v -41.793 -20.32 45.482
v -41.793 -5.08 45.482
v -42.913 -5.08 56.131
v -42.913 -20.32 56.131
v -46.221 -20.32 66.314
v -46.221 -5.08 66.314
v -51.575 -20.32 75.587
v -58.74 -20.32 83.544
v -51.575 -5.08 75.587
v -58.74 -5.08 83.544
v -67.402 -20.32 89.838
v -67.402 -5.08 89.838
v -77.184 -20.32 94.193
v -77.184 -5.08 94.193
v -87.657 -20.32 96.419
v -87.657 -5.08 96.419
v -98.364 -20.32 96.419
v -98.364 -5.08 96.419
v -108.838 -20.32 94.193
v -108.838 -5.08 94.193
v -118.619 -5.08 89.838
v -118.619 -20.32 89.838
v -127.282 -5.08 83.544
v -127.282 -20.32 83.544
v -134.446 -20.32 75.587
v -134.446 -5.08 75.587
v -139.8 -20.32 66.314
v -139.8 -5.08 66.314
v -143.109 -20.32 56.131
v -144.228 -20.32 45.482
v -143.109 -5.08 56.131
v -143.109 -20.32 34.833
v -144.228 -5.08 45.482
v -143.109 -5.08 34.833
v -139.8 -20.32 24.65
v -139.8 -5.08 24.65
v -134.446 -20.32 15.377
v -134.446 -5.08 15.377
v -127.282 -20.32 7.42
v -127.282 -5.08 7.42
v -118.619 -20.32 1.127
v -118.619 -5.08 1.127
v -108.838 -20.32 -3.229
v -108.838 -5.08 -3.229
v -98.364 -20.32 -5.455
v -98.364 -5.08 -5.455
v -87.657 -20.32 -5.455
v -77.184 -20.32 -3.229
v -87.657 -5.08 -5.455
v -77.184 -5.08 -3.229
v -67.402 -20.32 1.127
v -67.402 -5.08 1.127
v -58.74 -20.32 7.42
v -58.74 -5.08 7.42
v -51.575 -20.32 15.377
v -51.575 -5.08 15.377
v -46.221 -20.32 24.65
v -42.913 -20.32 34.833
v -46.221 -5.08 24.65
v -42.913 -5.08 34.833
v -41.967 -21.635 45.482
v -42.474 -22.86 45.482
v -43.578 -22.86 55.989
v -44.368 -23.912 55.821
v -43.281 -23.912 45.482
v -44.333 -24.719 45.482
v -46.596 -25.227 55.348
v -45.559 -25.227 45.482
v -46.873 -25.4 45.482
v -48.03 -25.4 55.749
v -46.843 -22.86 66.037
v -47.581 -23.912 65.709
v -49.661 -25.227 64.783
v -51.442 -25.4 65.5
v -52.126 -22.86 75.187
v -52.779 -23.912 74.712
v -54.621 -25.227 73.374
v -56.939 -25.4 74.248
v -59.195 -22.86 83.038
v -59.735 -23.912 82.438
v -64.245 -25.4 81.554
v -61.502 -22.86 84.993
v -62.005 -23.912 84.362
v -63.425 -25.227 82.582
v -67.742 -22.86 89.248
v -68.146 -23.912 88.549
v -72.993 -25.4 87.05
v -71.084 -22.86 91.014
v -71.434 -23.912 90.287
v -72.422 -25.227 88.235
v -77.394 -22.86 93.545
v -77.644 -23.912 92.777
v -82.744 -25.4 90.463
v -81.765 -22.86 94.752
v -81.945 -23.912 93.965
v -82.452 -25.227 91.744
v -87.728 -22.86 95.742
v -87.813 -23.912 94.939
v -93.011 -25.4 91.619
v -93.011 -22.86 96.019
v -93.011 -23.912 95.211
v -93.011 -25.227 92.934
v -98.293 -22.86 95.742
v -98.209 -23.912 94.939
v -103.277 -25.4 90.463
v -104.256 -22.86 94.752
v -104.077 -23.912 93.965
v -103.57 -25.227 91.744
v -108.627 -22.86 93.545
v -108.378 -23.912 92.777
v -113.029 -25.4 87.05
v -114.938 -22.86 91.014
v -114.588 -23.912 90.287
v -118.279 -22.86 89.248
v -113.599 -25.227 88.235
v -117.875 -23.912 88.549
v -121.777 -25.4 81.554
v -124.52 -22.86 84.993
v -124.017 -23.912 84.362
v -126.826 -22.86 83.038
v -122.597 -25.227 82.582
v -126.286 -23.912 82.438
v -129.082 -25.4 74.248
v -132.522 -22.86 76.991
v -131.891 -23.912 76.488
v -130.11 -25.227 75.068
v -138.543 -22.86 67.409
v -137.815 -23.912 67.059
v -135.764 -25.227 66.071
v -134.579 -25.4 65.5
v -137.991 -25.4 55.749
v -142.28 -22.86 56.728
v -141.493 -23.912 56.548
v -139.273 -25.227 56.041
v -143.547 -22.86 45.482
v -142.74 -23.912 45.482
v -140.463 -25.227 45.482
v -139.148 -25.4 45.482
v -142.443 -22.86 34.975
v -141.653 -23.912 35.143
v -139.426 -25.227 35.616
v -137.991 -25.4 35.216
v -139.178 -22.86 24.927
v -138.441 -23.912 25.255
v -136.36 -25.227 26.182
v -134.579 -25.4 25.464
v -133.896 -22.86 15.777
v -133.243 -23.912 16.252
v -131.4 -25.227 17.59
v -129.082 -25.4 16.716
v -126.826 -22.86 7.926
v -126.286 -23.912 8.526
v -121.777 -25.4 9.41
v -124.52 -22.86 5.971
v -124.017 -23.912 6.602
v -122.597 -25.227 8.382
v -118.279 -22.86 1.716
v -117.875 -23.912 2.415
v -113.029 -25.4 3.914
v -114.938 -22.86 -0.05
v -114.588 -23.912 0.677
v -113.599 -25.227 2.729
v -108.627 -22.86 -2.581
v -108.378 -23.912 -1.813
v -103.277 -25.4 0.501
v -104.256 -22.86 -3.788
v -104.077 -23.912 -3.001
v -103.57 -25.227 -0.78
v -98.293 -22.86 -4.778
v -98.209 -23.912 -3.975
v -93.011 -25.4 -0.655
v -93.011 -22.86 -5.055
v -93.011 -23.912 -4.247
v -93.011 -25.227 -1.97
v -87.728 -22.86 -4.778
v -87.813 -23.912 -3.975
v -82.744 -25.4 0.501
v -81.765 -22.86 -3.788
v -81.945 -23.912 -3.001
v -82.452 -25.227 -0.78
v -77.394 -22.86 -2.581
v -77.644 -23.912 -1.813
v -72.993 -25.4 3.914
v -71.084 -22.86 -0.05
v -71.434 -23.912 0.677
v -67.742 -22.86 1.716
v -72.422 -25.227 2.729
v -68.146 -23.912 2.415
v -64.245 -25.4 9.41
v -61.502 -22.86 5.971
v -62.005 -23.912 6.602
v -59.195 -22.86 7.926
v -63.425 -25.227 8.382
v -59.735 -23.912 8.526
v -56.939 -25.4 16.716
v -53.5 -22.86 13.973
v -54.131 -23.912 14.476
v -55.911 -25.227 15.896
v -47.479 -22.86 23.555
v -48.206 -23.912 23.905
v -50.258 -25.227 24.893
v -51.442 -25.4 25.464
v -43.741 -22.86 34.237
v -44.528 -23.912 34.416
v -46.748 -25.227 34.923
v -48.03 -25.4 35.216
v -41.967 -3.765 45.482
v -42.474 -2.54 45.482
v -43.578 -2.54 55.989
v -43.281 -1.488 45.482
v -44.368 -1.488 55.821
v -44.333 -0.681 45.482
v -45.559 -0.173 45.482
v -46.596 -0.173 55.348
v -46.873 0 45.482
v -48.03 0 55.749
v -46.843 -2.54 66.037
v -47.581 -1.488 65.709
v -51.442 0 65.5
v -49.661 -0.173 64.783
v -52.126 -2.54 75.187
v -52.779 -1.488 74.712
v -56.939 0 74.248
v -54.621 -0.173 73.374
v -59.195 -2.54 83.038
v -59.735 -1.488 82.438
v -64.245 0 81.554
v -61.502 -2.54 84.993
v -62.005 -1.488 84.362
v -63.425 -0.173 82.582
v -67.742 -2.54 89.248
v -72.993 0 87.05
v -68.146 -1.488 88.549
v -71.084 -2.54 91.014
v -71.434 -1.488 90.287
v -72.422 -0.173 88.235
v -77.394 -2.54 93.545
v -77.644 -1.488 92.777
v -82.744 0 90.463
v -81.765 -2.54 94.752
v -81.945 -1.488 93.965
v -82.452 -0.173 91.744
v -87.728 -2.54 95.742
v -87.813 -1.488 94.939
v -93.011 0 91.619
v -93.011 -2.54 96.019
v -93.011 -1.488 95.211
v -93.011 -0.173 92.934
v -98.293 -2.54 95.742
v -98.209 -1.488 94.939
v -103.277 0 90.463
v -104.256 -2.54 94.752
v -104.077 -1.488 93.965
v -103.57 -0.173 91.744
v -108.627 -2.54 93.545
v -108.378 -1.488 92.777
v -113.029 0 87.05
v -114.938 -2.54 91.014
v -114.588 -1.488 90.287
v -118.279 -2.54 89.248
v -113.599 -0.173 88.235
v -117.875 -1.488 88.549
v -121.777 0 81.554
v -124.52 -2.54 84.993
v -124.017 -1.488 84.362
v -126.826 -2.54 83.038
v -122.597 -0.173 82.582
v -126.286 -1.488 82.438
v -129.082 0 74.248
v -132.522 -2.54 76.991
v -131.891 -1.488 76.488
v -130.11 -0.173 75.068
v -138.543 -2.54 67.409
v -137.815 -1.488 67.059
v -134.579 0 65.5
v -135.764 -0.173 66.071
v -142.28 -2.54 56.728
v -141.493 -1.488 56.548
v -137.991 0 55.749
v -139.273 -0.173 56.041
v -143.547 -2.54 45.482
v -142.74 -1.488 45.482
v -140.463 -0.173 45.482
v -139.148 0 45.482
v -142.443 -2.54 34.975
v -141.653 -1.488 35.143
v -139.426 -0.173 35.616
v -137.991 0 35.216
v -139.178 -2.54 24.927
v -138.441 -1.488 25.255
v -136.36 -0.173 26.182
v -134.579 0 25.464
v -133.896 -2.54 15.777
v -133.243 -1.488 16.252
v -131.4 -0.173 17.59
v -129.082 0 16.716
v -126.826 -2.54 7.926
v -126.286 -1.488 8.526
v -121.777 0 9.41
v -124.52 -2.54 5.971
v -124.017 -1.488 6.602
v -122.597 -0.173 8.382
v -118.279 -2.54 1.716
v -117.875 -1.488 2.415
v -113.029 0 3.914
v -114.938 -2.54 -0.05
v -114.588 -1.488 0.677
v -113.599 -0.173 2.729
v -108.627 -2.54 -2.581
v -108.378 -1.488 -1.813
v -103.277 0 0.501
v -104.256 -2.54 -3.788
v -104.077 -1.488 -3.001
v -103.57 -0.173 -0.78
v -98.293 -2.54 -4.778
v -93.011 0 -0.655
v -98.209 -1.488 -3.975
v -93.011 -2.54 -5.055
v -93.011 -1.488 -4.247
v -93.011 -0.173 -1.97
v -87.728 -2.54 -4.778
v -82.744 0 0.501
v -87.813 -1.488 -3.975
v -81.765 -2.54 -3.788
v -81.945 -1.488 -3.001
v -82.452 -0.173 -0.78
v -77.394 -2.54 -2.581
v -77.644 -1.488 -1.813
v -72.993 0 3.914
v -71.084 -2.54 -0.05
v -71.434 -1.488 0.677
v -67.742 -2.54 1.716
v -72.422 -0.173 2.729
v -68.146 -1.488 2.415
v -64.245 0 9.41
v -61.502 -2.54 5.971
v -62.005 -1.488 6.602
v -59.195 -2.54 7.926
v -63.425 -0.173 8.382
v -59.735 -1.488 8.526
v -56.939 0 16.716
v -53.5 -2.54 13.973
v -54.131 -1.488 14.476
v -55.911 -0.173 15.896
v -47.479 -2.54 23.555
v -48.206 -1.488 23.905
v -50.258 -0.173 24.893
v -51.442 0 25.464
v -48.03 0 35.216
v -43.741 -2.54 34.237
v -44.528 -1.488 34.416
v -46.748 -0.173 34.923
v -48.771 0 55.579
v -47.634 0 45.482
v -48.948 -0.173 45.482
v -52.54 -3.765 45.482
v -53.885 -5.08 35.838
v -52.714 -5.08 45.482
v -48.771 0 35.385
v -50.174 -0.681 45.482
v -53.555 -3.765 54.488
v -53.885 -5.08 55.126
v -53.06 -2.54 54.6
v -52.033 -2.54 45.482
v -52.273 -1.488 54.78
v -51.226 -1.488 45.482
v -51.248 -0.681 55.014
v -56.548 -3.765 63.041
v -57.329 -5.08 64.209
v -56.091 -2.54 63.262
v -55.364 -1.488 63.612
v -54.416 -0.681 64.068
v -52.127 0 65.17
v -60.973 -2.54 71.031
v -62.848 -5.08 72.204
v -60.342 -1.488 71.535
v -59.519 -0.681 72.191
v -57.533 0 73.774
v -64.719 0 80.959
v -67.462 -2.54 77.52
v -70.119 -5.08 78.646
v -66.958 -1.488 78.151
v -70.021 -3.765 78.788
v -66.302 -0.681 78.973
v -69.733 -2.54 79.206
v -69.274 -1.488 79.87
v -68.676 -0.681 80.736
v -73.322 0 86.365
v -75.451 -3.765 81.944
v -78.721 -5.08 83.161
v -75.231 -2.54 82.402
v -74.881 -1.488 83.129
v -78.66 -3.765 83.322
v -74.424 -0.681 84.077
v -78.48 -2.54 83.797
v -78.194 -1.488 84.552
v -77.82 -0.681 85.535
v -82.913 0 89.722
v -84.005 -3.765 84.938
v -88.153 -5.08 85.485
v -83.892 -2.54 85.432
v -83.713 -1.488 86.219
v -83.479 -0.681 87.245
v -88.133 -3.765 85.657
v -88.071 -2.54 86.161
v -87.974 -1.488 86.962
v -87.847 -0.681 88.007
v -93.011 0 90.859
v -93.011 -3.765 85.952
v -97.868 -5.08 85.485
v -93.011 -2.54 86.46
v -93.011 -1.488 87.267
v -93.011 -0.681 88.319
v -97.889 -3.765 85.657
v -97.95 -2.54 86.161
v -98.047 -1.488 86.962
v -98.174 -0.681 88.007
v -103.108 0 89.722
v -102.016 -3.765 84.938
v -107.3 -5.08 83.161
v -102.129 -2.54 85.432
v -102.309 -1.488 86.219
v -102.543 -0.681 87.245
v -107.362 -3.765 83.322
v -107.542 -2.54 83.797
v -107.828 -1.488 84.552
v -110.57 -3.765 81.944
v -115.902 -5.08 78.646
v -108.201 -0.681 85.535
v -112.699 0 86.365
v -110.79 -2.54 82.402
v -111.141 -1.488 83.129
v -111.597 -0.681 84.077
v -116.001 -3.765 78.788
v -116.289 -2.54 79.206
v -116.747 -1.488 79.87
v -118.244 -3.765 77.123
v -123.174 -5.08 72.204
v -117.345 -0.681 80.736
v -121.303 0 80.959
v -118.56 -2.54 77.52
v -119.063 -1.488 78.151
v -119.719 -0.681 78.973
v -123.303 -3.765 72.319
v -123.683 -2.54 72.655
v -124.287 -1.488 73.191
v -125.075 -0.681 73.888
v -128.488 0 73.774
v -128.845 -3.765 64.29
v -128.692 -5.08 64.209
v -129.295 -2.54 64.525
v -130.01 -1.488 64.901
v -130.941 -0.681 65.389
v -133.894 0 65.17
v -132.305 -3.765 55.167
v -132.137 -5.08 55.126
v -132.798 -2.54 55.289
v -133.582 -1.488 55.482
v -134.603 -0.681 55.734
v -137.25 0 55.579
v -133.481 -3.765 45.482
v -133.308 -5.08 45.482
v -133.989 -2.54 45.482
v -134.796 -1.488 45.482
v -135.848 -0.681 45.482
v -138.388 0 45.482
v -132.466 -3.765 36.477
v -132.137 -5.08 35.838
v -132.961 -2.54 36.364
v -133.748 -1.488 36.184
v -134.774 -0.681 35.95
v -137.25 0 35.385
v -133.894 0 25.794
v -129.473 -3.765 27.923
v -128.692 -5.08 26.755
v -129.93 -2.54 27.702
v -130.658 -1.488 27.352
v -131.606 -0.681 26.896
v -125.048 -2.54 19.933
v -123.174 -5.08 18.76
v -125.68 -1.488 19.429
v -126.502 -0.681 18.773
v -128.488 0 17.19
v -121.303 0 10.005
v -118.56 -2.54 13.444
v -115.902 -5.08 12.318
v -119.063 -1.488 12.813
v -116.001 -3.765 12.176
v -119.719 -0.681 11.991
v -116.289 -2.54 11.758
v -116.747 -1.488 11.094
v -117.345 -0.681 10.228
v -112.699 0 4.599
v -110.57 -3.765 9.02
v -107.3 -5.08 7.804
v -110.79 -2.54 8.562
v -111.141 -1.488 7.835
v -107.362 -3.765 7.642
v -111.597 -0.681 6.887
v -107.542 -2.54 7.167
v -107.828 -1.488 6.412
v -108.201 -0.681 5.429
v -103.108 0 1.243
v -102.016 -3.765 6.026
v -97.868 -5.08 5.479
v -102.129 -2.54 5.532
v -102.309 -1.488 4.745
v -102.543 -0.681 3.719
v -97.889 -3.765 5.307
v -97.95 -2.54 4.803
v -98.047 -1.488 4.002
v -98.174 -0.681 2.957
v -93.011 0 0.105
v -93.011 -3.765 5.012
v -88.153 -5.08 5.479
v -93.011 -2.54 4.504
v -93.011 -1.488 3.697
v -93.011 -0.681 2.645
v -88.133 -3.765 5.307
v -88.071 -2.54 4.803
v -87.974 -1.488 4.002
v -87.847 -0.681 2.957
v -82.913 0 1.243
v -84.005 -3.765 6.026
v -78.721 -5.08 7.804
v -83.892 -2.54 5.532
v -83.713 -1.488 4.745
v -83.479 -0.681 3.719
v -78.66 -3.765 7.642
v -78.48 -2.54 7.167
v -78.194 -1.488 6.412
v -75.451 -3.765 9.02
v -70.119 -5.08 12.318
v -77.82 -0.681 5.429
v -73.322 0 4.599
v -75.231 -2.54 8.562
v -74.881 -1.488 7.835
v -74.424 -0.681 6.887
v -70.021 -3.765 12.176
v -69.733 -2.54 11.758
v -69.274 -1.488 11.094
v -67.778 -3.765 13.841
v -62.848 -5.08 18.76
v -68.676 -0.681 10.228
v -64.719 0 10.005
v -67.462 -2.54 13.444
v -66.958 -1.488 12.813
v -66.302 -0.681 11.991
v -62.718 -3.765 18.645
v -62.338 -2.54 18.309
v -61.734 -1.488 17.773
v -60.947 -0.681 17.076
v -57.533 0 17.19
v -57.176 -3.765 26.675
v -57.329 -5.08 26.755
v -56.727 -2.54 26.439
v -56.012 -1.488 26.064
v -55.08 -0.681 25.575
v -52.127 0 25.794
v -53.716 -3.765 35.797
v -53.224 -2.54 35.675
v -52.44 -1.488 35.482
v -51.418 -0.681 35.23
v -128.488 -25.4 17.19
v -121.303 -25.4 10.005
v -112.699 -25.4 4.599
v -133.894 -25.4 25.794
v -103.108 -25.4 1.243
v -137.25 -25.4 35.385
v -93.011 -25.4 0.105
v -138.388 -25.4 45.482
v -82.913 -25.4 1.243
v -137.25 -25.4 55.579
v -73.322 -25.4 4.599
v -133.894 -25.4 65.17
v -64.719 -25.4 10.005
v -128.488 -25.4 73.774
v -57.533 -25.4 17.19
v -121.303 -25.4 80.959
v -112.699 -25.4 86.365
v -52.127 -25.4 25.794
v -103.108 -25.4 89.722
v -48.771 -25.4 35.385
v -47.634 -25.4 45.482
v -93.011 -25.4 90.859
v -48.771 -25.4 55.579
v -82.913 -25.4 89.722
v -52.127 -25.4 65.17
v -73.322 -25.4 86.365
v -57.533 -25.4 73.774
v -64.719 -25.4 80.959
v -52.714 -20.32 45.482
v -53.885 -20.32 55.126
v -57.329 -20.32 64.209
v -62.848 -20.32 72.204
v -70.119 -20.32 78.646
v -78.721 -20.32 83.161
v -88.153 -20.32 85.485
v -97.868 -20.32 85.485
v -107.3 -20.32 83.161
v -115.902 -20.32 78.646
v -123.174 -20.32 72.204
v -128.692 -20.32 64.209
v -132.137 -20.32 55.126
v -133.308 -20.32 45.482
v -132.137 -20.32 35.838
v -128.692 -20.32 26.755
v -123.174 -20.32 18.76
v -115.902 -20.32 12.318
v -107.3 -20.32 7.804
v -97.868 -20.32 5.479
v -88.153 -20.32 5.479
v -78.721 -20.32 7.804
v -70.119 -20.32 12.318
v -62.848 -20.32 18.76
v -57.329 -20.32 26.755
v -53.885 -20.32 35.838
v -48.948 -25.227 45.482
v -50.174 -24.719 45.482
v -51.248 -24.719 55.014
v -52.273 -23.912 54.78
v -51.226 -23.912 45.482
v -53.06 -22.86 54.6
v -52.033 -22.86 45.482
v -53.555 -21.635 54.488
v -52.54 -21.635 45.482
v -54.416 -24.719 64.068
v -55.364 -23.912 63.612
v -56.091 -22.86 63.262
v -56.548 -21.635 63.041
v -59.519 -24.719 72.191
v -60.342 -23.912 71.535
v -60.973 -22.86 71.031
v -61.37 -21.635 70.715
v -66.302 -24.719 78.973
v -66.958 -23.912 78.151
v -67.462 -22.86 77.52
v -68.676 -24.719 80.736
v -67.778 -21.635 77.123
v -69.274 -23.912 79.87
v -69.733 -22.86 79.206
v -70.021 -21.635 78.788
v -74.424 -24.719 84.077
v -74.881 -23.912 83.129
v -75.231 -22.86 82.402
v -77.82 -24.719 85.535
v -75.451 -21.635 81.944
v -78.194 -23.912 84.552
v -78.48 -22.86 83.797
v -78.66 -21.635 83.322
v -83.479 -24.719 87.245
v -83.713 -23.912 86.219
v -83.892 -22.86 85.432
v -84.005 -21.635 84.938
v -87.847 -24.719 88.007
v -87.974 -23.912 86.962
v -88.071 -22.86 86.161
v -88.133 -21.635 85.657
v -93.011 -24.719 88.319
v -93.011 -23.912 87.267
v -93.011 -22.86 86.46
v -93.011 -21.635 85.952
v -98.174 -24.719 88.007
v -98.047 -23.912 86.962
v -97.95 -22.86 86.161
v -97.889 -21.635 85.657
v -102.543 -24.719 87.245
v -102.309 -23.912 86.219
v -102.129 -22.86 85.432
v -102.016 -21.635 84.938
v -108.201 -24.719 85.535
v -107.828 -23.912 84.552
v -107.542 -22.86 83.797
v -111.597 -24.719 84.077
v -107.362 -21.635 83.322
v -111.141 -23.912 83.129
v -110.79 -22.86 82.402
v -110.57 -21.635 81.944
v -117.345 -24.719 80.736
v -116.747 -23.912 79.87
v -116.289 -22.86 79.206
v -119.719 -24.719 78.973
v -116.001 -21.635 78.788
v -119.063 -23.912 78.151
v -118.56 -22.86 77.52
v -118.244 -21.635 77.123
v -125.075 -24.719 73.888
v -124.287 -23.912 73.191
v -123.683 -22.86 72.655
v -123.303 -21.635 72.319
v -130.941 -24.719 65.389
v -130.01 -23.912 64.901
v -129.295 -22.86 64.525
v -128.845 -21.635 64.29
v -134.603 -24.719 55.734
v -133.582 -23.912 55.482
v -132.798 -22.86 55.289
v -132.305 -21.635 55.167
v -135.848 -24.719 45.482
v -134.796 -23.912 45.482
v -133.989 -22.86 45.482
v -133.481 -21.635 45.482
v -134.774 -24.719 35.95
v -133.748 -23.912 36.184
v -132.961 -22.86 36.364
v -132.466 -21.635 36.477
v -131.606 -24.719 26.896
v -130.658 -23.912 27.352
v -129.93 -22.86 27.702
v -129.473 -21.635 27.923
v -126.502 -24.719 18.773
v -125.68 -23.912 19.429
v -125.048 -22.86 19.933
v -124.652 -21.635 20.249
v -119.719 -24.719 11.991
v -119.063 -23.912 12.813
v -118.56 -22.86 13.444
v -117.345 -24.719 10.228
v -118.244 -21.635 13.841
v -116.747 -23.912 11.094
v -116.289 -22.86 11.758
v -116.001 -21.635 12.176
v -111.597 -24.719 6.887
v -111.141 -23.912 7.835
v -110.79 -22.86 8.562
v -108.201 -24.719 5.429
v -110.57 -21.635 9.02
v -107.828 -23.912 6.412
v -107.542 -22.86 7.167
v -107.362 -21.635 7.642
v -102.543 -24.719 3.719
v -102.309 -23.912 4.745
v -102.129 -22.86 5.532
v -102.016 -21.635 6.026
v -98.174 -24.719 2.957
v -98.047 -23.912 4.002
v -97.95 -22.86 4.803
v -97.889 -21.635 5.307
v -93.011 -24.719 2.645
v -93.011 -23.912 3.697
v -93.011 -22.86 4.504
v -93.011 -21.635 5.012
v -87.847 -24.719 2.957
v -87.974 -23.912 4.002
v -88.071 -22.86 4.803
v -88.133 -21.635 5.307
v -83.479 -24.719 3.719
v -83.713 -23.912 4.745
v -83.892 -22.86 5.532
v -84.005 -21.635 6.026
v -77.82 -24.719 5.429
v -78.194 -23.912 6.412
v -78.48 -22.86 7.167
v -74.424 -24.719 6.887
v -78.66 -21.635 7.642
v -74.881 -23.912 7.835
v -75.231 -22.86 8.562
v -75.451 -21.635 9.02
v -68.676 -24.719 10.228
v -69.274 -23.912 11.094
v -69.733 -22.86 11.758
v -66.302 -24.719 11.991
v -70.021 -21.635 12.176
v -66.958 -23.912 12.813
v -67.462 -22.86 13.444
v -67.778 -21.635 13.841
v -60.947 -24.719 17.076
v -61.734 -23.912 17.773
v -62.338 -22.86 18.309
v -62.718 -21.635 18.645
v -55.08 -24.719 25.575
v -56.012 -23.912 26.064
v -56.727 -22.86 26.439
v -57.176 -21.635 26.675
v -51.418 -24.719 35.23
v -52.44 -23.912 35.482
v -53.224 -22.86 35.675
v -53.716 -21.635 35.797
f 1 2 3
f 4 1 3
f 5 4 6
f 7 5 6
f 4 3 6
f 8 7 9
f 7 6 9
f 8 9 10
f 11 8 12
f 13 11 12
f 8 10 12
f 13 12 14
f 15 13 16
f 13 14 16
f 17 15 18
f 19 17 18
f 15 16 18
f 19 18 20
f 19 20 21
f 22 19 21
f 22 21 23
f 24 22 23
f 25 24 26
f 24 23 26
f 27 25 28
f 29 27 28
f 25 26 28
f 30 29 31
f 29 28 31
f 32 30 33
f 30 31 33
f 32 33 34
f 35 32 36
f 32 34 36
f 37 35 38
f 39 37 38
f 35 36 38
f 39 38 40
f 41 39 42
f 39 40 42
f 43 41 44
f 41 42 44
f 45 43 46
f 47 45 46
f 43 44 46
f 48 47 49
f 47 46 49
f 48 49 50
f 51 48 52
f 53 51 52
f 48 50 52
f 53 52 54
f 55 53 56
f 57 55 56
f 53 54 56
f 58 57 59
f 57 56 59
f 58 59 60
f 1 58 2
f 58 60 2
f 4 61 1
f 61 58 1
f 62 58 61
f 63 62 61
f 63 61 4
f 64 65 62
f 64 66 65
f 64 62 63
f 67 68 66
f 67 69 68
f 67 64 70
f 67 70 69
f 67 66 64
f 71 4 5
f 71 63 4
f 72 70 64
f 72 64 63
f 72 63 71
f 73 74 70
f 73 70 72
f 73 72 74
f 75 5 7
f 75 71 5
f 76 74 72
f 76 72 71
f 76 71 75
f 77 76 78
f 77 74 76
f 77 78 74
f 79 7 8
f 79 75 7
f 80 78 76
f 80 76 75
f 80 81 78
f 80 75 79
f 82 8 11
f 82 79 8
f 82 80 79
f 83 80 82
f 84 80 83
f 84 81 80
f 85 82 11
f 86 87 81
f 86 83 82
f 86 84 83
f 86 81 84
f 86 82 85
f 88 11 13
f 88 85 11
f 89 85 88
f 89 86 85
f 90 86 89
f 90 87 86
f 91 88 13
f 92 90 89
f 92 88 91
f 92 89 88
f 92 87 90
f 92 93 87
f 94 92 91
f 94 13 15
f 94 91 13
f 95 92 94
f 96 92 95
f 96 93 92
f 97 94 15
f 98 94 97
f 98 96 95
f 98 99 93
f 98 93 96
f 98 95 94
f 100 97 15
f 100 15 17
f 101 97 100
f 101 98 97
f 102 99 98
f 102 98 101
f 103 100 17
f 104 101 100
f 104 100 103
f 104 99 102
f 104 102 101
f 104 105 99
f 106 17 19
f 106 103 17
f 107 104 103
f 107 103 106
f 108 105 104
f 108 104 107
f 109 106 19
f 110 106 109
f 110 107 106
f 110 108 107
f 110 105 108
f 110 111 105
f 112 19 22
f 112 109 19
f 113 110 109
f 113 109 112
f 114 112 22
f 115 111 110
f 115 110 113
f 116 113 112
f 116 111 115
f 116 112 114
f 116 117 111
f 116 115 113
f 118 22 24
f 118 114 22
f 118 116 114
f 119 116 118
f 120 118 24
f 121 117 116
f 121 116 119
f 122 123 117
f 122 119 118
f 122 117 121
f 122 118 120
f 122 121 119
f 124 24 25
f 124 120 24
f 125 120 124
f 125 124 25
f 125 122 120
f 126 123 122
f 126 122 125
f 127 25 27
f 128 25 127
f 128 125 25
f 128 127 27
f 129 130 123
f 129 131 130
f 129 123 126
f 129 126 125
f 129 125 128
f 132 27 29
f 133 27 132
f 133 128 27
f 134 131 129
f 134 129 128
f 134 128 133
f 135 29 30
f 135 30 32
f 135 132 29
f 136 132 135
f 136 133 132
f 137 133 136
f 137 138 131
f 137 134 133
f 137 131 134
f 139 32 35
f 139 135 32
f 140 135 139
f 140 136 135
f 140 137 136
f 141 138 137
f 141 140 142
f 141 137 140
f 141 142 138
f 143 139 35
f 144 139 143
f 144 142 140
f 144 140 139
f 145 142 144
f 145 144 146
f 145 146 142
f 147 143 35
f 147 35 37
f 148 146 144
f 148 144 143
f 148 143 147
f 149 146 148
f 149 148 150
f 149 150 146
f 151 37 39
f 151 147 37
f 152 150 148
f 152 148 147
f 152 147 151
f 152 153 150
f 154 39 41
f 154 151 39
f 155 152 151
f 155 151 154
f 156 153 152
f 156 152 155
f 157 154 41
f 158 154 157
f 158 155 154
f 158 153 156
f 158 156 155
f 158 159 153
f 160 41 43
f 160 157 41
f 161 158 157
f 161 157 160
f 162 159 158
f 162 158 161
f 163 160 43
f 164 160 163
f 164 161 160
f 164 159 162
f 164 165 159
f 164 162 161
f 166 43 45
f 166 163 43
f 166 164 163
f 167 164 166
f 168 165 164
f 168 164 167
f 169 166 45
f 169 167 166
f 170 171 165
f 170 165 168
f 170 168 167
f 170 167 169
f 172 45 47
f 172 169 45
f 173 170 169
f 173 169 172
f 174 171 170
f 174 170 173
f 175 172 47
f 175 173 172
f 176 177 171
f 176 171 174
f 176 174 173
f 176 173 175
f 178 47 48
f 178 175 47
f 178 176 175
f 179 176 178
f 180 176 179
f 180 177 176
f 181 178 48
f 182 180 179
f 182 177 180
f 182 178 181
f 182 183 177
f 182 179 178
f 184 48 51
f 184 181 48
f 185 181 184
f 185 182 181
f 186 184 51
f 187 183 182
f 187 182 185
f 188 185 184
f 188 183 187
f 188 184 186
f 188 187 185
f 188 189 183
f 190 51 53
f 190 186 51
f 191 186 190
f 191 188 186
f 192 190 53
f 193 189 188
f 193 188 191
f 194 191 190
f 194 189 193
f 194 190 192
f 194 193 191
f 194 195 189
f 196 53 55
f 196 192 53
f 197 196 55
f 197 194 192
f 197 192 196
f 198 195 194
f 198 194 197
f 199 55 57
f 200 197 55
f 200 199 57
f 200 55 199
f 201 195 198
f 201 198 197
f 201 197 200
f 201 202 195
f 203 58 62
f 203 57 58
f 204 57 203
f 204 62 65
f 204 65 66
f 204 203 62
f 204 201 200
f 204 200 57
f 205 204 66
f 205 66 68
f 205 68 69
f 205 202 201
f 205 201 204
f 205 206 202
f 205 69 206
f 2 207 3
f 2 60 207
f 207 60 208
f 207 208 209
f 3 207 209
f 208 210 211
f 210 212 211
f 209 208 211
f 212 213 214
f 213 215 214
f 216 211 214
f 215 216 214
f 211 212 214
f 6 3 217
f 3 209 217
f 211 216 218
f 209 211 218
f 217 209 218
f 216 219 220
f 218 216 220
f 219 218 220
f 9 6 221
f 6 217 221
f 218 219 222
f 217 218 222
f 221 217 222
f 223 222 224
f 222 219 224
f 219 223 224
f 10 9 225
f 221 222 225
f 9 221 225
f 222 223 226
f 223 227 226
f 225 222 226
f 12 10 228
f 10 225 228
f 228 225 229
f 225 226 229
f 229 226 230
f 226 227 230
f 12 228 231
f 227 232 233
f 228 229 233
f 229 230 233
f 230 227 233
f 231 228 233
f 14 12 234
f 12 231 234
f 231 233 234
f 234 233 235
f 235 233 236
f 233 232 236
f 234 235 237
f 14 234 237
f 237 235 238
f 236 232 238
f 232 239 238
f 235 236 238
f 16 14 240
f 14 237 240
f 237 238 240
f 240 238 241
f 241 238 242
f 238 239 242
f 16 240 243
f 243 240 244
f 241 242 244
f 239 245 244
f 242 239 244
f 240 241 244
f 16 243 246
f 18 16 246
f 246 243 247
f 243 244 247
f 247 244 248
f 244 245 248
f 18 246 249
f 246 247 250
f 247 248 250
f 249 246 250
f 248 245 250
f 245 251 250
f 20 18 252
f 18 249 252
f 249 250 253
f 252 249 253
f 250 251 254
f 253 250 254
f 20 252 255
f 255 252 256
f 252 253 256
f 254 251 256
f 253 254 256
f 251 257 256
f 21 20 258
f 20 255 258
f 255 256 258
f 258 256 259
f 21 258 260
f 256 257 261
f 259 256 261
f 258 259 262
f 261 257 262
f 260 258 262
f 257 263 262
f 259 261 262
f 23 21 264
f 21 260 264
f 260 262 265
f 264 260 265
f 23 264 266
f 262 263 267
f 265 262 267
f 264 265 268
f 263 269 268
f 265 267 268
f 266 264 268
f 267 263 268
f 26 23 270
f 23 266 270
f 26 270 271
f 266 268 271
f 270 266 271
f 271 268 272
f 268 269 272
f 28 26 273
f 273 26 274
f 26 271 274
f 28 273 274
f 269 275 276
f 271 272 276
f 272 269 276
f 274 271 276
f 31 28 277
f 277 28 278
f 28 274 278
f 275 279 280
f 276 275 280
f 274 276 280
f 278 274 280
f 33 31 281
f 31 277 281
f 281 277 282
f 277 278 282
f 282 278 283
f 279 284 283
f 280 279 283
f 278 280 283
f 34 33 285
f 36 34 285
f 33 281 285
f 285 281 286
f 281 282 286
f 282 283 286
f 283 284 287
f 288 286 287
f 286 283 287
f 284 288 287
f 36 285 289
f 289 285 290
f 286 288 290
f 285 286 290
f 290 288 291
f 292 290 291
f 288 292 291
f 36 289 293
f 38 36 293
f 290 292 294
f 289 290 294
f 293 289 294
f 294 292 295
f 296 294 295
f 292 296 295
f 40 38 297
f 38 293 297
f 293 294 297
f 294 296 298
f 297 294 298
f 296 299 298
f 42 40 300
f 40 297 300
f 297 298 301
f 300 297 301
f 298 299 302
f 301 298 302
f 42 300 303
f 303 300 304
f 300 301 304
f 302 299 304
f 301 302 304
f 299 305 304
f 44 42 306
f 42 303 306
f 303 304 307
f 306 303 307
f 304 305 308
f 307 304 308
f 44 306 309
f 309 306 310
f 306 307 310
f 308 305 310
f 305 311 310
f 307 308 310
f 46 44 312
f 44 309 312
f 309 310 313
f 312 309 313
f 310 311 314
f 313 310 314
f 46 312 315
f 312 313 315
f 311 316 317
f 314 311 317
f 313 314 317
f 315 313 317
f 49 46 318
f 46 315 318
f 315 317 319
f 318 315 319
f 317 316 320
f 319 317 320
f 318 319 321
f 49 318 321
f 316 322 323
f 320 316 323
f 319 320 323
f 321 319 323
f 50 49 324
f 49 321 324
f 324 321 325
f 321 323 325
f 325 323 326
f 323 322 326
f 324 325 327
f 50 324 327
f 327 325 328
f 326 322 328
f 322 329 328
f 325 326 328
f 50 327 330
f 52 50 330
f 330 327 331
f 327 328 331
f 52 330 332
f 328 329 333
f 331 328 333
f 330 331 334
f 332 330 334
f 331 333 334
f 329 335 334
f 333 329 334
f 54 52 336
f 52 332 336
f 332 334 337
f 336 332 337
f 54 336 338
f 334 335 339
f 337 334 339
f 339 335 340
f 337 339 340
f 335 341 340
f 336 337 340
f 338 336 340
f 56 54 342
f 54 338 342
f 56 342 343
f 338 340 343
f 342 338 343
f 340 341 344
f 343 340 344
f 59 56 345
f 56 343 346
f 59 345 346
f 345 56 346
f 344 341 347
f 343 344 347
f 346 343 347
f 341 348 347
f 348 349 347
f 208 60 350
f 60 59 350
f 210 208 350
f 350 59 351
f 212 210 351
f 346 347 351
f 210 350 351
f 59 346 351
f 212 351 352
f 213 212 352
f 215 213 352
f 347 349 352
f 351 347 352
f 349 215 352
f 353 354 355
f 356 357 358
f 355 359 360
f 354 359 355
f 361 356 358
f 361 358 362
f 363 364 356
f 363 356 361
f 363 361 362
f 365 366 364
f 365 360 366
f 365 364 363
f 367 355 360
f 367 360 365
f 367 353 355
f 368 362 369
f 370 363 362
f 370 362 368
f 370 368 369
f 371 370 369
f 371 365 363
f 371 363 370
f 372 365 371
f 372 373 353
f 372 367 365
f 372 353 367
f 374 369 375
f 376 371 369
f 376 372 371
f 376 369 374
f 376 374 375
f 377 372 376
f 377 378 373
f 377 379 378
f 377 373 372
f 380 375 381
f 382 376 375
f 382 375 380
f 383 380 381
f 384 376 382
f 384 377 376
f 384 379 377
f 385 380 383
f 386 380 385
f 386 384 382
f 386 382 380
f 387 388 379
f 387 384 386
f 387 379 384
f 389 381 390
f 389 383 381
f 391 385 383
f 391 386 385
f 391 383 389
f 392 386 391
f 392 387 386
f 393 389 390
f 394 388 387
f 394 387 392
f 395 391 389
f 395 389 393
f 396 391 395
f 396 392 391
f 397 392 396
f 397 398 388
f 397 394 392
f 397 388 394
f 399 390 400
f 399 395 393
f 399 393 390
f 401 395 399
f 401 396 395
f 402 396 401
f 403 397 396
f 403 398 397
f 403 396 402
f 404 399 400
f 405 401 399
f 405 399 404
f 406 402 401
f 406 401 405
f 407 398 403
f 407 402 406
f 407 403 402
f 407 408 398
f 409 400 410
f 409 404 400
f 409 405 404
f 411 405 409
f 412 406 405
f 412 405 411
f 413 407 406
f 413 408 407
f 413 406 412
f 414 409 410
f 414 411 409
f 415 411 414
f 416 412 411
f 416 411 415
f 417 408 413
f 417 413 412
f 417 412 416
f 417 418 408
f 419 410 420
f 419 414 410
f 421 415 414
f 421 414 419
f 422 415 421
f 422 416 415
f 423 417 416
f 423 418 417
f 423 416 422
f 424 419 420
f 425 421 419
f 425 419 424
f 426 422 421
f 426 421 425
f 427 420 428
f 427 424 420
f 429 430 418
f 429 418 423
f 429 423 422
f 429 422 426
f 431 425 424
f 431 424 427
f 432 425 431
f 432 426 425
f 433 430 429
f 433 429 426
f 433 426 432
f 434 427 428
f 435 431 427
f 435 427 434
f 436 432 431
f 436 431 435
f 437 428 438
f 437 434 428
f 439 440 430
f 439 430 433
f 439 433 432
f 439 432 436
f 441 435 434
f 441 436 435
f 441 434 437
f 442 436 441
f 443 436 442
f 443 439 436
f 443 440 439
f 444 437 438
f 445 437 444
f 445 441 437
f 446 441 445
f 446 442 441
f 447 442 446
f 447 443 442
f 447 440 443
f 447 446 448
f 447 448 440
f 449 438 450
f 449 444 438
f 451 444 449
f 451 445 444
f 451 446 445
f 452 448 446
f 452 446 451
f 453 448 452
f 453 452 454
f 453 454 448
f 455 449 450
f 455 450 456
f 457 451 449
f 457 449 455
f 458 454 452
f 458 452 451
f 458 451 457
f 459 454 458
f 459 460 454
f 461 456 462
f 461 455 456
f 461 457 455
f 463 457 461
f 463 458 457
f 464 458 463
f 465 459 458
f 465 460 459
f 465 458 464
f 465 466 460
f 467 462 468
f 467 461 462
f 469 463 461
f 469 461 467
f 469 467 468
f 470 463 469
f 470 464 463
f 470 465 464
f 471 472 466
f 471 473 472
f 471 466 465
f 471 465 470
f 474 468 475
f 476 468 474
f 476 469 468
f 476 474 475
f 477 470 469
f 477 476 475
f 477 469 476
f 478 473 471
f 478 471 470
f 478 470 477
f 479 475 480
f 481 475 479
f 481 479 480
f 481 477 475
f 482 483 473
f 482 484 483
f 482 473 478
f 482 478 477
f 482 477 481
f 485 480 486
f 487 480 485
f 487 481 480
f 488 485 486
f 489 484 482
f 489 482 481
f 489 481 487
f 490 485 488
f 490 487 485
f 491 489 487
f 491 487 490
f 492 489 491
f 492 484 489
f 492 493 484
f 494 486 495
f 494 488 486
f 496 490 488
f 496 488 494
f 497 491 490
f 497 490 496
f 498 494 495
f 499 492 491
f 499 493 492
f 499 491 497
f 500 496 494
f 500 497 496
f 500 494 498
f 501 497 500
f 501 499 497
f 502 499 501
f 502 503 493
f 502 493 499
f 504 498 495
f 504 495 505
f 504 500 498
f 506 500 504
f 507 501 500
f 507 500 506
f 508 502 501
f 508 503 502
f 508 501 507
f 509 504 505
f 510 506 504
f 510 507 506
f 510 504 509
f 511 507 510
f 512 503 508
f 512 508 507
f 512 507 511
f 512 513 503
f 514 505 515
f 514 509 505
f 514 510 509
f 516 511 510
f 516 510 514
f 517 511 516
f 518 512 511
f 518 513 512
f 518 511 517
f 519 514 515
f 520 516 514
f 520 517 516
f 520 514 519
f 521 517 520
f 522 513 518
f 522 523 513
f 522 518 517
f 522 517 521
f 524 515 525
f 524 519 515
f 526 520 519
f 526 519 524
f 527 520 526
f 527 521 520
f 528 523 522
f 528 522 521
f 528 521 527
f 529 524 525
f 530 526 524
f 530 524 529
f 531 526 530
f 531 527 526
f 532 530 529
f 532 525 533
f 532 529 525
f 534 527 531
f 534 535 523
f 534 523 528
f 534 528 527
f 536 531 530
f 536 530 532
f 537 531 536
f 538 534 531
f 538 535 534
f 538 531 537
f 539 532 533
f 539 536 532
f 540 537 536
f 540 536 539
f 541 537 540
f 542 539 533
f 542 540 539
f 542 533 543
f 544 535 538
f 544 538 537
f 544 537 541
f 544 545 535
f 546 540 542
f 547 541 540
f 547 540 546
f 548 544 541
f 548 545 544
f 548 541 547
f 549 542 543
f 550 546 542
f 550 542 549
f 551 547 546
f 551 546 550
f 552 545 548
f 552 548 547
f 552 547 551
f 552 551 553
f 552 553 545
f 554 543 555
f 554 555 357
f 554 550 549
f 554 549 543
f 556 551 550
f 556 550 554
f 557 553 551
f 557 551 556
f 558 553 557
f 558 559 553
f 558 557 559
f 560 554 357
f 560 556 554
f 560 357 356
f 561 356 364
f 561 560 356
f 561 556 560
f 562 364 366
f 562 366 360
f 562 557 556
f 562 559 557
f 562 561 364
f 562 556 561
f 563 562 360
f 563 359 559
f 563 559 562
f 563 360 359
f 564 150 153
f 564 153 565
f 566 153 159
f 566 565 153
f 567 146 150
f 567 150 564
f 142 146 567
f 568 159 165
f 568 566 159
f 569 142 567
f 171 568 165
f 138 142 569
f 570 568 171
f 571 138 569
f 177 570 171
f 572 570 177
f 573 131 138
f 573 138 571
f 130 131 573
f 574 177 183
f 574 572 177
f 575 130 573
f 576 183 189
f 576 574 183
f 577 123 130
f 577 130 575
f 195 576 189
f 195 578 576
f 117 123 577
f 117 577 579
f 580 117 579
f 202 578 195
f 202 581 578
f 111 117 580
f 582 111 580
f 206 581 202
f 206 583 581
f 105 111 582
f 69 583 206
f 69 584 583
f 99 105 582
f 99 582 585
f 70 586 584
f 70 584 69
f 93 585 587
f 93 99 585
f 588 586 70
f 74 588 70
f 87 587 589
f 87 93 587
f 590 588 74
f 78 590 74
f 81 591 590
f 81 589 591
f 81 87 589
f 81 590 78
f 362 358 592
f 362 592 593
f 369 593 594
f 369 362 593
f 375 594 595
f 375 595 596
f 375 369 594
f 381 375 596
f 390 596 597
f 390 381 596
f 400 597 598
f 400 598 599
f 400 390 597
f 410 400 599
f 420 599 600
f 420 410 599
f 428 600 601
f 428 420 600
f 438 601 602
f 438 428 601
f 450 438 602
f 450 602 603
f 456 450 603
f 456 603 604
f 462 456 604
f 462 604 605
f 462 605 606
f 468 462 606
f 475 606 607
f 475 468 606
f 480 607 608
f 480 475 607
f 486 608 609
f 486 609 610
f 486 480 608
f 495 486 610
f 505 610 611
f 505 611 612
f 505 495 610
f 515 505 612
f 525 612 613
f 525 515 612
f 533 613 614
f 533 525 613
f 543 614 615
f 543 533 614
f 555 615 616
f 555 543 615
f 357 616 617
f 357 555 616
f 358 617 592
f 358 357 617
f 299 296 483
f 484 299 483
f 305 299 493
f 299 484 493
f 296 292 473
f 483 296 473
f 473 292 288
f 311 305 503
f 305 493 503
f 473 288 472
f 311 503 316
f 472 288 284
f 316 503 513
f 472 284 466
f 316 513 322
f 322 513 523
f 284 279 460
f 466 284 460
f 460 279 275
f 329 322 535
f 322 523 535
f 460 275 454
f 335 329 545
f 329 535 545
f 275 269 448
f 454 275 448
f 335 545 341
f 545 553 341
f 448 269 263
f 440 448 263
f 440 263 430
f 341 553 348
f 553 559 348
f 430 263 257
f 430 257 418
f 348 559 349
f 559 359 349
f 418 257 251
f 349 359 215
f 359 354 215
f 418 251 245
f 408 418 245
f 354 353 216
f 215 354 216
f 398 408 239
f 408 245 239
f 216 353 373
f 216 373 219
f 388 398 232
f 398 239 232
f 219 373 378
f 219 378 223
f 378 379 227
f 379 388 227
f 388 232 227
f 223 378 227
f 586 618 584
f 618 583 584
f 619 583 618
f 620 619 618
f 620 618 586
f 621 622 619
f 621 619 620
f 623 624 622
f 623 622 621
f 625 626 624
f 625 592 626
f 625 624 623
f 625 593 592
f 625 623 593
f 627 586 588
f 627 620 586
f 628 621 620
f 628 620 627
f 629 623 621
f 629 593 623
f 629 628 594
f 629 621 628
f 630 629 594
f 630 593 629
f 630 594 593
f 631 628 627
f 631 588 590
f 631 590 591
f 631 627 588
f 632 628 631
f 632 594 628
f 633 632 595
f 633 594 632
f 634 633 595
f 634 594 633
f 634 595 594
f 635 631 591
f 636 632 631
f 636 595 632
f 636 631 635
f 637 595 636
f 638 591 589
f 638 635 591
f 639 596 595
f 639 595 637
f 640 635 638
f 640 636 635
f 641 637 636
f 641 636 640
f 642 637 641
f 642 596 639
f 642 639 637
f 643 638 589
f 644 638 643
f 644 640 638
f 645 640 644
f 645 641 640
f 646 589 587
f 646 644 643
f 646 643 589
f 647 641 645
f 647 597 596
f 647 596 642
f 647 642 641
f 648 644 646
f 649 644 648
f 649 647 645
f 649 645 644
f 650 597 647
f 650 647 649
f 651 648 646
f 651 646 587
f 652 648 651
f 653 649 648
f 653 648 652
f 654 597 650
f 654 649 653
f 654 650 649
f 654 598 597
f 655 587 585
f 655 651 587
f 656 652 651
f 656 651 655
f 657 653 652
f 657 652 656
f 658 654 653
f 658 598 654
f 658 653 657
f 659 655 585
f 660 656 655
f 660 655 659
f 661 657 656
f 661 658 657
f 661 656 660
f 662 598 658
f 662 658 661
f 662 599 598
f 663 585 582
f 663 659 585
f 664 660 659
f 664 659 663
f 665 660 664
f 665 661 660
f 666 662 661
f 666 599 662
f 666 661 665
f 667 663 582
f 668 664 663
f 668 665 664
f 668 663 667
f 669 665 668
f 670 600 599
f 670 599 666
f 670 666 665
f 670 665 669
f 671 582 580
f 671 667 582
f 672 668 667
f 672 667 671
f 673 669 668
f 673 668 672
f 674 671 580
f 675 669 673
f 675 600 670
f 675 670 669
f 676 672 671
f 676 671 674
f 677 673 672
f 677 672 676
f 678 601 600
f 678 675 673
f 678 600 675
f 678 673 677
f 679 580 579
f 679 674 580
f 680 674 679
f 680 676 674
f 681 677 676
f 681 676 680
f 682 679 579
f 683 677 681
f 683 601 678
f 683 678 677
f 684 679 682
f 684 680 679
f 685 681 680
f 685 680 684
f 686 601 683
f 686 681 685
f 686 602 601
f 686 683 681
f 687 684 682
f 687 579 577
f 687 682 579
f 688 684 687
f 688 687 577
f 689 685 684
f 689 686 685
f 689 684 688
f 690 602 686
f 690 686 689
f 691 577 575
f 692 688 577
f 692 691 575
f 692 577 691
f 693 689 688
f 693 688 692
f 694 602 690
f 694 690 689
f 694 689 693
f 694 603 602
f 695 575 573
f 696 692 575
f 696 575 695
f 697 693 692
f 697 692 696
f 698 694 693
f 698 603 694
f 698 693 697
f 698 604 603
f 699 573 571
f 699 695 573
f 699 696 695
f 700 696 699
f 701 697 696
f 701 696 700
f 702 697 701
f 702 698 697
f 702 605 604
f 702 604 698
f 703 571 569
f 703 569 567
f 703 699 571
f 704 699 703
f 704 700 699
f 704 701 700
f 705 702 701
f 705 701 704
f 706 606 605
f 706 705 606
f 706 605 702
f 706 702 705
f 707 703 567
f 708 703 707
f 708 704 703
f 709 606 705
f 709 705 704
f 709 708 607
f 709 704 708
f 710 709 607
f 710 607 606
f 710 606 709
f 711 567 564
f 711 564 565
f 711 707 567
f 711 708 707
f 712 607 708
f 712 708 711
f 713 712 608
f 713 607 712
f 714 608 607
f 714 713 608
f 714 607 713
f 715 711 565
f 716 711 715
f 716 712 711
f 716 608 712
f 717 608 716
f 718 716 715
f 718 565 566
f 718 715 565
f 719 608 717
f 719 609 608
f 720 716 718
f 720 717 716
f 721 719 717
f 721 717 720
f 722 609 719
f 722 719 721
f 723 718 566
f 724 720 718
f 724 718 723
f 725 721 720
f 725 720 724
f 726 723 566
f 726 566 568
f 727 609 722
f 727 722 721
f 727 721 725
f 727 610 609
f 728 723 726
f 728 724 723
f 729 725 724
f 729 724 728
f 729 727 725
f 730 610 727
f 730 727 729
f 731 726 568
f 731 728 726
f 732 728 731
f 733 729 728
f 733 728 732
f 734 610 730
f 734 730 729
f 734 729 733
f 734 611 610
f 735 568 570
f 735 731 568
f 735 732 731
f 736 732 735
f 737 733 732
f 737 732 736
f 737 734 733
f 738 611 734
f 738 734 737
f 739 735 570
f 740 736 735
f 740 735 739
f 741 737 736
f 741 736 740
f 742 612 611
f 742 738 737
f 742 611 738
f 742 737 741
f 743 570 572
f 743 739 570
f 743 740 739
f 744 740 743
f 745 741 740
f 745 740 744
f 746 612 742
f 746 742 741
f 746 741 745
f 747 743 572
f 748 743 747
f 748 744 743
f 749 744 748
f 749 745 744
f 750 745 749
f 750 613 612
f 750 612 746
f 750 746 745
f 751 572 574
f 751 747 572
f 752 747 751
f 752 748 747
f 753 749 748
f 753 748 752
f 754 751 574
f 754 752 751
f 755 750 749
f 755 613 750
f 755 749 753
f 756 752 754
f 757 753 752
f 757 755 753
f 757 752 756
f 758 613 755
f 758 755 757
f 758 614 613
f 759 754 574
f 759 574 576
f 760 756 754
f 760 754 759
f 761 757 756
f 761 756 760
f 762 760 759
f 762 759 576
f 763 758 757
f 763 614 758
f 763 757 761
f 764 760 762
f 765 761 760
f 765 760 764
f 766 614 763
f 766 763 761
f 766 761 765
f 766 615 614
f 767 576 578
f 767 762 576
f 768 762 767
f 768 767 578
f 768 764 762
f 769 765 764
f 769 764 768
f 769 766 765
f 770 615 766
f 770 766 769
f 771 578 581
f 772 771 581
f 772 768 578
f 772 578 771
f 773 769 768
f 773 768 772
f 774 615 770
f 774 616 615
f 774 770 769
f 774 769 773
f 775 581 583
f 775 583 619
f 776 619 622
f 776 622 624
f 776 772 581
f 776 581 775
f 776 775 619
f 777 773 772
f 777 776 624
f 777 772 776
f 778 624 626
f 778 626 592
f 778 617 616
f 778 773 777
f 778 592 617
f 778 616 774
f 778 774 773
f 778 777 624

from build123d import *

# Parameters (mm, degrees)
F0_R     = 51.217295
F0_R_2   = 40.297185
F1_DEPTH = 25.4
F2_R     = 5.08
F3_R     = 5.08
F4_R     = 5.08


with BuildPart() as f1:
    # F0 (on Front) → F1 (new body)
    with BuildSketch(Plane.XZ):
        with Locations((-93.010761, 45.482028)):
            Circle(F0_R)
        with Locations((-93.010761, 45.482028)):
            Circle(F0_R_2, mode=Mode.SUBTRACT)
    extrude(amount=F1_DEPTH)

    # F2
    f2_edges = [f1.edges().sort_by_distance(p)[0] for p in [
        (-144.228056, -25.4, 45.482028),
        (-144.228056, 0, 45.482028),
    ]]
    fillet(f2_edges, radius=F2_R)

    # F3
    f3_edges = [f1.edges().sort_by_distance(p)[0] for p in [
        (-133.307946, -25.4, 45.482028),
    ]]
    fillet(f3_edges, radius=F3_R)

    # F4
    f4_edges = [f1.edges().sort_by_distance(p)[0] for p in [
        (-133.307946, 0, 45.482028),
    ]]
    fillet(f4_edges, radius=F4_R)


solid = f1.part
